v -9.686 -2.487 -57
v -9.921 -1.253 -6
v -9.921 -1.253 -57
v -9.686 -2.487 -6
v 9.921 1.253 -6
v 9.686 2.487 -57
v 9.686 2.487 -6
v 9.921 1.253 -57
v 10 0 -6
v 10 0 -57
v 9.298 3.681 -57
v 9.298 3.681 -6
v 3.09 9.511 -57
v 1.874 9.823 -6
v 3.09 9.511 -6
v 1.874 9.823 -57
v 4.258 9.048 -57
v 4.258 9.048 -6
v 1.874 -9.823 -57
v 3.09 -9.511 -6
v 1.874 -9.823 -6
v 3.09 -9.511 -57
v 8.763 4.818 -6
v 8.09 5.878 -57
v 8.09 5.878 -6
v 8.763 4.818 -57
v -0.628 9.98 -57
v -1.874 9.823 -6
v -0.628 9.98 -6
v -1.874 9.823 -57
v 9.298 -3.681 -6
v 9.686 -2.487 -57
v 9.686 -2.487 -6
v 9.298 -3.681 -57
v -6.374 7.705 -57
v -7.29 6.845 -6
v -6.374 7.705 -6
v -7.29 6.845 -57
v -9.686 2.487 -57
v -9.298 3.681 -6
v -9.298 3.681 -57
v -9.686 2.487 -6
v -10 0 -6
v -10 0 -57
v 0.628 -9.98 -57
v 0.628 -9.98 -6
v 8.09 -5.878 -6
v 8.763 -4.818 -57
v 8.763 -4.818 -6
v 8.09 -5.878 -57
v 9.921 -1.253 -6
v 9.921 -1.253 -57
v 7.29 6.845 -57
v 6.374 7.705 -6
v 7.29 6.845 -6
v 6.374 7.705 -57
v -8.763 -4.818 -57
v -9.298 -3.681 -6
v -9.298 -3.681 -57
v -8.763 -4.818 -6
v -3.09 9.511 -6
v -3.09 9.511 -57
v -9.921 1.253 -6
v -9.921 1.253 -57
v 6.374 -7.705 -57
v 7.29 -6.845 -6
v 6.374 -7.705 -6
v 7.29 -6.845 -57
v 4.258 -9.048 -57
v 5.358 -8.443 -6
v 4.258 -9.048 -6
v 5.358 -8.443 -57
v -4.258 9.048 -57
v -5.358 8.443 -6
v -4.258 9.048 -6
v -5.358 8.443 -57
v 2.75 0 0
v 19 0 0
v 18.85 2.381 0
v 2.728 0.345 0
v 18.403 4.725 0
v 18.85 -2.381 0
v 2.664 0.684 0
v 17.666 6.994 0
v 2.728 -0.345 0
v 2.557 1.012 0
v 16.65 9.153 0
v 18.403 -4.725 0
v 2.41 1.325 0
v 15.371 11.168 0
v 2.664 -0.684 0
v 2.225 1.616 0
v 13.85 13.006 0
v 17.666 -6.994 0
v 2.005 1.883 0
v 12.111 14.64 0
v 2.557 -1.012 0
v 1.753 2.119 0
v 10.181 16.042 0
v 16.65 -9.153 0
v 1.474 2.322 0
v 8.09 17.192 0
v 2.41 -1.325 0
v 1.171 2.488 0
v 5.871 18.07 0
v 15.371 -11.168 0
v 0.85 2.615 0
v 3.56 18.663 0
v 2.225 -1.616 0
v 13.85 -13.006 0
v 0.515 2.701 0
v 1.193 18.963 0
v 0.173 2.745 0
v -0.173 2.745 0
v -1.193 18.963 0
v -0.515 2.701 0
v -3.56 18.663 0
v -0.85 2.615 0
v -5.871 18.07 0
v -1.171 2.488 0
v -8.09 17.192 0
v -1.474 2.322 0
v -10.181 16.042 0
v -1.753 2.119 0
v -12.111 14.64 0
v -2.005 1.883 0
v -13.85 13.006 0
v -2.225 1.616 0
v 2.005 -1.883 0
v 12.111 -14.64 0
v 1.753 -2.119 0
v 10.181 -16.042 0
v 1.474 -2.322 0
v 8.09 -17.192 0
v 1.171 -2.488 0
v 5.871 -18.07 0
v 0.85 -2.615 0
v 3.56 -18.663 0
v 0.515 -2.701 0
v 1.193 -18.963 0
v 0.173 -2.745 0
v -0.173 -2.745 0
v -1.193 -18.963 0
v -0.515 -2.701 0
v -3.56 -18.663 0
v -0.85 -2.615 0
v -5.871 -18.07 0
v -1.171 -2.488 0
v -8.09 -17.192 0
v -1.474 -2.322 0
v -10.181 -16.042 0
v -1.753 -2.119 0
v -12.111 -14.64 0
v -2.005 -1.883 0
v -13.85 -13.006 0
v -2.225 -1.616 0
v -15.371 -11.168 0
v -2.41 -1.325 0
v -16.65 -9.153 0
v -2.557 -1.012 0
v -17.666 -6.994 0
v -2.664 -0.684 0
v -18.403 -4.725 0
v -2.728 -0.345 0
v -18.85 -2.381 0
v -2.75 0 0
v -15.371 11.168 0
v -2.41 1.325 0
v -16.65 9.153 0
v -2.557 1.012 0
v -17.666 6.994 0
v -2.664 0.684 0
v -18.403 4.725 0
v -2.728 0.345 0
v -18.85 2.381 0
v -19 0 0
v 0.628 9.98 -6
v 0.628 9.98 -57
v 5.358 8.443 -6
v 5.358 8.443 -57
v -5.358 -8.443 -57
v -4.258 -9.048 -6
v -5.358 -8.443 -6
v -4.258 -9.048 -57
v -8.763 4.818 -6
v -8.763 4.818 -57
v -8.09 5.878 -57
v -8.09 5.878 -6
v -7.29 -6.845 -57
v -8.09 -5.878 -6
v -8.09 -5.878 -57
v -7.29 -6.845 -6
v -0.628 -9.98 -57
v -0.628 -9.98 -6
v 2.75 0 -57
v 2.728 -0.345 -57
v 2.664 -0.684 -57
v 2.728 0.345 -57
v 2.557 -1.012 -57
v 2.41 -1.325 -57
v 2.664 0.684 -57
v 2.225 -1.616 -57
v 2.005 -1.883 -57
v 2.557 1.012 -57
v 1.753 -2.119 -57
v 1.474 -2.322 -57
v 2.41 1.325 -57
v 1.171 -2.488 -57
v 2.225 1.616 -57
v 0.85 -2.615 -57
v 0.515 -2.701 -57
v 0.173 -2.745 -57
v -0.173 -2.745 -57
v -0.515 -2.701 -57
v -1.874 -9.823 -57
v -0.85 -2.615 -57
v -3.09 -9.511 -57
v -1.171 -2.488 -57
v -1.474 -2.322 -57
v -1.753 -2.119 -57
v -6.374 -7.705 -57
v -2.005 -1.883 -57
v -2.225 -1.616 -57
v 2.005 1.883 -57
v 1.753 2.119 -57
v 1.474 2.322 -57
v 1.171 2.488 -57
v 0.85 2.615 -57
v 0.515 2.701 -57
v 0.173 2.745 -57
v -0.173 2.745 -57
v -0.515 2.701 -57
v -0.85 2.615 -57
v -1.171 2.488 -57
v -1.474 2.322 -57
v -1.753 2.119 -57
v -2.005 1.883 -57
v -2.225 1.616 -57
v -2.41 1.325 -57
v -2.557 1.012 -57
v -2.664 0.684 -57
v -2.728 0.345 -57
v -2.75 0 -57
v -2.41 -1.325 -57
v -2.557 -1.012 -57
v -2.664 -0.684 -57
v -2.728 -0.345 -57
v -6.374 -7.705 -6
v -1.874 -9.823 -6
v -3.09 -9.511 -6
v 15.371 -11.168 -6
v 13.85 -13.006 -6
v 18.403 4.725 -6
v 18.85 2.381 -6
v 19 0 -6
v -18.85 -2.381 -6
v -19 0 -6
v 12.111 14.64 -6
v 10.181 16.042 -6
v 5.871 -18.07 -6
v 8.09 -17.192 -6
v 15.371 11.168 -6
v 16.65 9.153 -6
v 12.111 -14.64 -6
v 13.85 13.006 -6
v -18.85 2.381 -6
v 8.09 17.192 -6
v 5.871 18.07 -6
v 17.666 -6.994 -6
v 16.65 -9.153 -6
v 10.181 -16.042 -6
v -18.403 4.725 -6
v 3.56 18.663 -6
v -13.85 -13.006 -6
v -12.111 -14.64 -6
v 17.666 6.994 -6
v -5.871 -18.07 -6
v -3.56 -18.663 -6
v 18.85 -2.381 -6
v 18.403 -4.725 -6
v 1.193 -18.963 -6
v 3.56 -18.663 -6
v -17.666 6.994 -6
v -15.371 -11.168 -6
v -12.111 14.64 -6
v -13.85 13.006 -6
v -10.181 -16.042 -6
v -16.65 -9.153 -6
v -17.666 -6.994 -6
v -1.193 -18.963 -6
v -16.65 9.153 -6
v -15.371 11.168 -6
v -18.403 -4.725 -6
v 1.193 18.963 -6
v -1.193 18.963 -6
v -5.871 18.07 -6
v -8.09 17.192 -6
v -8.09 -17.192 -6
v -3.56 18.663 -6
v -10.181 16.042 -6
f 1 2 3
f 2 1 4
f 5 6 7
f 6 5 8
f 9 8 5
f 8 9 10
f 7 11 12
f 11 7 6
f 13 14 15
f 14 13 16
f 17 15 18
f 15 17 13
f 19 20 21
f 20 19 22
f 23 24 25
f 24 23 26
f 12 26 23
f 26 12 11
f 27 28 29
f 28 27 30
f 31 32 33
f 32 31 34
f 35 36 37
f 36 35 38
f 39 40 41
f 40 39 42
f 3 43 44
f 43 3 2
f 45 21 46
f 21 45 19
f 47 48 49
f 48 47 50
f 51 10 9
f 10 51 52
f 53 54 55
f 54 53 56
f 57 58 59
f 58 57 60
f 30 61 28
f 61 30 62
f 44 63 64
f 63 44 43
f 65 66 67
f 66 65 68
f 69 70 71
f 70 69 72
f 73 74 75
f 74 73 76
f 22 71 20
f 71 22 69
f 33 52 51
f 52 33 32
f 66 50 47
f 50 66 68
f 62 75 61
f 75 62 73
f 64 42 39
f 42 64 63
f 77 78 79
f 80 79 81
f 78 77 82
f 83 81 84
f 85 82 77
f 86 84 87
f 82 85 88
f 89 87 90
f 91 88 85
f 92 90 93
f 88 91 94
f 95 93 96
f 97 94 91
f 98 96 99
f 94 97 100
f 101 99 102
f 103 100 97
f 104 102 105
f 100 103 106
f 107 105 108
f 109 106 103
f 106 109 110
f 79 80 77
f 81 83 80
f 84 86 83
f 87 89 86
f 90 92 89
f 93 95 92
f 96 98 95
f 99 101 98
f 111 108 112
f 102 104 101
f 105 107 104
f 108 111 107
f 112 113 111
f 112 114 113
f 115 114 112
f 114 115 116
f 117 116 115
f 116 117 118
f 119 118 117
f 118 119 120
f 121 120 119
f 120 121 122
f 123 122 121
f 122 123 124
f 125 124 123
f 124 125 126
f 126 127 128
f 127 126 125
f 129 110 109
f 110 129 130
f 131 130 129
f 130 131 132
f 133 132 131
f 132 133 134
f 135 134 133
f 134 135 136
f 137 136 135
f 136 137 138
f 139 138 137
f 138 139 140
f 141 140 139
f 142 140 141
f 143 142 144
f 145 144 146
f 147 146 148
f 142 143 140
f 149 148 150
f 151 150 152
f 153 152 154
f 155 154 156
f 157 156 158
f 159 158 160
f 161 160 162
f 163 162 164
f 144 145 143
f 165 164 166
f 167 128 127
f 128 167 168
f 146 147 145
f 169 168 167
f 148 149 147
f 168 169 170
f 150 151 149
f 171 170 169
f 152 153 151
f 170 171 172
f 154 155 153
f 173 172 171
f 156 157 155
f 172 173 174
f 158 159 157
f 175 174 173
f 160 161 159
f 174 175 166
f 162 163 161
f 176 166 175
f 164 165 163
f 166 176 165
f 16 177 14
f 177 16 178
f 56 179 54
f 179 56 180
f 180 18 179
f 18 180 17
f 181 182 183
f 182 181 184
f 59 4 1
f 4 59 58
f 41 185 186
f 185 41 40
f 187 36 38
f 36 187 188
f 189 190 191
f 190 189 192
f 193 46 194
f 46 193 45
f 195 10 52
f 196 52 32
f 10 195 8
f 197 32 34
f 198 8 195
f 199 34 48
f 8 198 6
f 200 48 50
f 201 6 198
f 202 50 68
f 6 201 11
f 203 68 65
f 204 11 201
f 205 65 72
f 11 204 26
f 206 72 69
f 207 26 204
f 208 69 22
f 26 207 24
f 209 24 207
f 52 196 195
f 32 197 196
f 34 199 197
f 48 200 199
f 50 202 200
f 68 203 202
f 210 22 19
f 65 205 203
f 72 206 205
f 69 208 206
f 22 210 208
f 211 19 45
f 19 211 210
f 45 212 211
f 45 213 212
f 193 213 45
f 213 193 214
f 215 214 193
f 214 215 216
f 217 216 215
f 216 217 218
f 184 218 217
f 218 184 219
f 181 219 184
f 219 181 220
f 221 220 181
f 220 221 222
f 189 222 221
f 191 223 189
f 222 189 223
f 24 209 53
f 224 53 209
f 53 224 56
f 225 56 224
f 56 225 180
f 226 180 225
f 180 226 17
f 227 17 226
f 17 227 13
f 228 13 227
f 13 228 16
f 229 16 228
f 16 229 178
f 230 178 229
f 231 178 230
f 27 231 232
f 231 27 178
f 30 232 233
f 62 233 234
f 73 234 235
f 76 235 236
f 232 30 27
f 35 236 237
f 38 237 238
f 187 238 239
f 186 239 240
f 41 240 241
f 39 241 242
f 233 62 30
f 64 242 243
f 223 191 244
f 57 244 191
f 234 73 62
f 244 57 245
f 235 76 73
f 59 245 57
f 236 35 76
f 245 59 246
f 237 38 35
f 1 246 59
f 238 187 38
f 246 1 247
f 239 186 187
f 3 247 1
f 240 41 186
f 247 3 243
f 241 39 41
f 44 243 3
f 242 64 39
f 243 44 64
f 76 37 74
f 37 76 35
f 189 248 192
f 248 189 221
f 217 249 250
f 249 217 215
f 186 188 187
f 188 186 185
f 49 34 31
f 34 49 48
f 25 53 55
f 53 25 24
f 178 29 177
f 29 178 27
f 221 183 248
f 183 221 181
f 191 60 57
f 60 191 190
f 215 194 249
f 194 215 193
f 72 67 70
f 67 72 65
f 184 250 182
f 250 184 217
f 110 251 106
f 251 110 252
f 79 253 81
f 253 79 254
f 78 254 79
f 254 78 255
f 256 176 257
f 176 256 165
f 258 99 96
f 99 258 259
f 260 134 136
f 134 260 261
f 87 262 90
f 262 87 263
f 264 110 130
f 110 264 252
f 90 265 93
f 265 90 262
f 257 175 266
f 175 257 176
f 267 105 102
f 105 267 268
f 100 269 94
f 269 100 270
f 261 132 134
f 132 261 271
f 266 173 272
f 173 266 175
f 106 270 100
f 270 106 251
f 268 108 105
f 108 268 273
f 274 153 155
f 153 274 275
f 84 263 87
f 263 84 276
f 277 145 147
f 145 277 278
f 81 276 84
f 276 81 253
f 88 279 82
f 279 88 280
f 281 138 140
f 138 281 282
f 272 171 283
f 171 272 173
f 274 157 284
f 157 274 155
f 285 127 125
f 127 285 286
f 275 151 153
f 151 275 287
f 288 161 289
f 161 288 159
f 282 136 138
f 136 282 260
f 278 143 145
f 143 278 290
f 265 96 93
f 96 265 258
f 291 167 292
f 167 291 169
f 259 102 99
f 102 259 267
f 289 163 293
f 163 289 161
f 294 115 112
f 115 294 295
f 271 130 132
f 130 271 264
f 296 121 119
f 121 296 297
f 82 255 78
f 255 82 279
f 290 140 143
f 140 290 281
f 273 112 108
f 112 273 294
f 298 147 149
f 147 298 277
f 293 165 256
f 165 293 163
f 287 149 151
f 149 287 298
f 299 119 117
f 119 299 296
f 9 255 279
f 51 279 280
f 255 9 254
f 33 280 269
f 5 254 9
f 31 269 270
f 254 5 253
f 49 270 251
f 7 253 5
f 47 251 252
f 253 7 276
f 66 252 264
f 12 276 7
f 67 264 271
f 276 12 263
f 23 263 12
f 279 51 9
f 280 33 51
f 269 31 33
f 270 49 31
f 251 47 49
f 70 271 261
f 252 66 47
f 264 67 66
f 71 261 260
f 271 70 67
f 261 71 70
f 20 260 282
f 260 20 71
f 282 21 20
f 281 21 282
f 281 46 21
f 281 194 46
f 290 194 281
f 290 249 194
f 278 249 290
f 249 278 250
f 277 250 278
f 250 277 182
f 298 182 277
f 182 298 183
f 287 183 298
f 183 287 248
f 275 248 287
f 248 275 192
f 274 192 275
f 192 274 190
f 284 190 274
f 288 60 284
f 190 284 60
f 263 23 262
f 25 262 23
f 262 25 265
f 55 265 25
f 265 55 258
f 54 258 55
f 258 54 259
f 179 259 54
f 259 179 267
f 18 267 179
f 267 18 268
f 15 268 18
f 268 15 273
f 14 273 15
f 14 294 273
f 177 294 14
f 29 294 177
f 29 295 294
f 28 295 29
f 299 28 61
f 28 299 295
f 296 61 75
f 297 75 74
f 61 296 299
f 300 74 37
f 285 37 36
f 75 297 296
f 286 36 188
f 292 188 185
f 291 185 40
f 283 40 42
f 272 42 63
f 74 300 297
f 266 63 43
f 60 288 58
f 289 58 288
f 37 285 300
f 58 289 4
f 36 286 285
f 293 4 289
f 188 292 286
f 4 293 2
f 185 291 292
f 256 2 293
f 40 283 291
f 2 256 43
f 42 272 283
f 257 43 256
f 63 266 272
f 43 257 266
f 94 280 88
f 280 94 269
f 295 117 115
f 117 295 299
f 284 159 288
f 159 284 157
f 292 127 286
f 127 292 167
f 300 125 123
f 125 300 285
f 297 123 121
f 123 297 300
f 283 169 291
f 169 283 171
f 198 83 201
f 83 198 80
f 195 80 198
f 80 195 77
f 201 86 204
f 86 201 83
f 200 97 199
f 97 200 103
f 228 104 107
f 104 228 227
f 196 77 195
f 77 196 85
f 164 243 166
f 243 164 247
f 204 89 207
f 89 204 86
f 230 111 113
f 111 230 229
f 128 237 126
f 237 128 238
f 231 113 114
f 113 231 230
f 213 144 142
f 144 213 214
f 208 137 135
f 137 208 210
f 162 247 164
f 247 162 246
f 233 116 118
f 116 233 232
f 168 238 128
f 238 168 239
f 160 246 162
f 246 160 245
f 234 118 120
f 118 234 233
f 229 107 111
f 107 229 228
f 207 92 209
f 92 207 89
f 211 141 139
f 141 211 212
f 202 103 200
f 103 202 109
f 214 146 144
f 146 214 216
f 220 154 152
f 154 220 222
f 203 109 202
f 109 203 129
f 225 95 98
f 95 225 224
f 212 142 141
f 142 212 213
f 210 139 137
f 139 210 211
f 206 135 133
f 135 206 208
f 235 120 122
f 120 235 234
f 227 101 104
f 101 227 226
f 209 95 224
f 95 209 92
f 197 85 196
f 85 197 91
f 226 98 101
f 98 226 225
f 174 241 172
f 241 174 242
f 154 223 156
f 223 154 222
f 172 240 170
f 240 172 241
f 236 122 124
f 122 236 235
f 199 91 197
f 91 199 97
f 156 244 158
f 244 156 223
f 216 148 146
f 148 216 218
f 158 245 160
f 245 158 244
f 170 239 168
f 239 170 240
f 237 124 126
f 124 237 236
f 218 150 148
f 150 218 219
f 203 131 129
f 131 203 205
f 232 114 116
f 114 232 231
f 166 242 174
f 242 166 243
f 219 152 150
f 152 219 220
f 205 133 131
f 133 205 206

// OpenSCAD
$fn = 50;


difference() {
	union() {
		translate(v = [0, 0, -57.0000000000]) {
			cylinder(h = 57, r = 10.0000000000);
		}
		translate(v = [0, 0, -6.0000000000]) {
			cylinder(h = 6, r = 19.0000000000);
		}
	}
	union() {
		#translate(v = [0, 0, -57]) {
			cylinder(h = 57, r = 2.7500000000);
		}
	}
}
